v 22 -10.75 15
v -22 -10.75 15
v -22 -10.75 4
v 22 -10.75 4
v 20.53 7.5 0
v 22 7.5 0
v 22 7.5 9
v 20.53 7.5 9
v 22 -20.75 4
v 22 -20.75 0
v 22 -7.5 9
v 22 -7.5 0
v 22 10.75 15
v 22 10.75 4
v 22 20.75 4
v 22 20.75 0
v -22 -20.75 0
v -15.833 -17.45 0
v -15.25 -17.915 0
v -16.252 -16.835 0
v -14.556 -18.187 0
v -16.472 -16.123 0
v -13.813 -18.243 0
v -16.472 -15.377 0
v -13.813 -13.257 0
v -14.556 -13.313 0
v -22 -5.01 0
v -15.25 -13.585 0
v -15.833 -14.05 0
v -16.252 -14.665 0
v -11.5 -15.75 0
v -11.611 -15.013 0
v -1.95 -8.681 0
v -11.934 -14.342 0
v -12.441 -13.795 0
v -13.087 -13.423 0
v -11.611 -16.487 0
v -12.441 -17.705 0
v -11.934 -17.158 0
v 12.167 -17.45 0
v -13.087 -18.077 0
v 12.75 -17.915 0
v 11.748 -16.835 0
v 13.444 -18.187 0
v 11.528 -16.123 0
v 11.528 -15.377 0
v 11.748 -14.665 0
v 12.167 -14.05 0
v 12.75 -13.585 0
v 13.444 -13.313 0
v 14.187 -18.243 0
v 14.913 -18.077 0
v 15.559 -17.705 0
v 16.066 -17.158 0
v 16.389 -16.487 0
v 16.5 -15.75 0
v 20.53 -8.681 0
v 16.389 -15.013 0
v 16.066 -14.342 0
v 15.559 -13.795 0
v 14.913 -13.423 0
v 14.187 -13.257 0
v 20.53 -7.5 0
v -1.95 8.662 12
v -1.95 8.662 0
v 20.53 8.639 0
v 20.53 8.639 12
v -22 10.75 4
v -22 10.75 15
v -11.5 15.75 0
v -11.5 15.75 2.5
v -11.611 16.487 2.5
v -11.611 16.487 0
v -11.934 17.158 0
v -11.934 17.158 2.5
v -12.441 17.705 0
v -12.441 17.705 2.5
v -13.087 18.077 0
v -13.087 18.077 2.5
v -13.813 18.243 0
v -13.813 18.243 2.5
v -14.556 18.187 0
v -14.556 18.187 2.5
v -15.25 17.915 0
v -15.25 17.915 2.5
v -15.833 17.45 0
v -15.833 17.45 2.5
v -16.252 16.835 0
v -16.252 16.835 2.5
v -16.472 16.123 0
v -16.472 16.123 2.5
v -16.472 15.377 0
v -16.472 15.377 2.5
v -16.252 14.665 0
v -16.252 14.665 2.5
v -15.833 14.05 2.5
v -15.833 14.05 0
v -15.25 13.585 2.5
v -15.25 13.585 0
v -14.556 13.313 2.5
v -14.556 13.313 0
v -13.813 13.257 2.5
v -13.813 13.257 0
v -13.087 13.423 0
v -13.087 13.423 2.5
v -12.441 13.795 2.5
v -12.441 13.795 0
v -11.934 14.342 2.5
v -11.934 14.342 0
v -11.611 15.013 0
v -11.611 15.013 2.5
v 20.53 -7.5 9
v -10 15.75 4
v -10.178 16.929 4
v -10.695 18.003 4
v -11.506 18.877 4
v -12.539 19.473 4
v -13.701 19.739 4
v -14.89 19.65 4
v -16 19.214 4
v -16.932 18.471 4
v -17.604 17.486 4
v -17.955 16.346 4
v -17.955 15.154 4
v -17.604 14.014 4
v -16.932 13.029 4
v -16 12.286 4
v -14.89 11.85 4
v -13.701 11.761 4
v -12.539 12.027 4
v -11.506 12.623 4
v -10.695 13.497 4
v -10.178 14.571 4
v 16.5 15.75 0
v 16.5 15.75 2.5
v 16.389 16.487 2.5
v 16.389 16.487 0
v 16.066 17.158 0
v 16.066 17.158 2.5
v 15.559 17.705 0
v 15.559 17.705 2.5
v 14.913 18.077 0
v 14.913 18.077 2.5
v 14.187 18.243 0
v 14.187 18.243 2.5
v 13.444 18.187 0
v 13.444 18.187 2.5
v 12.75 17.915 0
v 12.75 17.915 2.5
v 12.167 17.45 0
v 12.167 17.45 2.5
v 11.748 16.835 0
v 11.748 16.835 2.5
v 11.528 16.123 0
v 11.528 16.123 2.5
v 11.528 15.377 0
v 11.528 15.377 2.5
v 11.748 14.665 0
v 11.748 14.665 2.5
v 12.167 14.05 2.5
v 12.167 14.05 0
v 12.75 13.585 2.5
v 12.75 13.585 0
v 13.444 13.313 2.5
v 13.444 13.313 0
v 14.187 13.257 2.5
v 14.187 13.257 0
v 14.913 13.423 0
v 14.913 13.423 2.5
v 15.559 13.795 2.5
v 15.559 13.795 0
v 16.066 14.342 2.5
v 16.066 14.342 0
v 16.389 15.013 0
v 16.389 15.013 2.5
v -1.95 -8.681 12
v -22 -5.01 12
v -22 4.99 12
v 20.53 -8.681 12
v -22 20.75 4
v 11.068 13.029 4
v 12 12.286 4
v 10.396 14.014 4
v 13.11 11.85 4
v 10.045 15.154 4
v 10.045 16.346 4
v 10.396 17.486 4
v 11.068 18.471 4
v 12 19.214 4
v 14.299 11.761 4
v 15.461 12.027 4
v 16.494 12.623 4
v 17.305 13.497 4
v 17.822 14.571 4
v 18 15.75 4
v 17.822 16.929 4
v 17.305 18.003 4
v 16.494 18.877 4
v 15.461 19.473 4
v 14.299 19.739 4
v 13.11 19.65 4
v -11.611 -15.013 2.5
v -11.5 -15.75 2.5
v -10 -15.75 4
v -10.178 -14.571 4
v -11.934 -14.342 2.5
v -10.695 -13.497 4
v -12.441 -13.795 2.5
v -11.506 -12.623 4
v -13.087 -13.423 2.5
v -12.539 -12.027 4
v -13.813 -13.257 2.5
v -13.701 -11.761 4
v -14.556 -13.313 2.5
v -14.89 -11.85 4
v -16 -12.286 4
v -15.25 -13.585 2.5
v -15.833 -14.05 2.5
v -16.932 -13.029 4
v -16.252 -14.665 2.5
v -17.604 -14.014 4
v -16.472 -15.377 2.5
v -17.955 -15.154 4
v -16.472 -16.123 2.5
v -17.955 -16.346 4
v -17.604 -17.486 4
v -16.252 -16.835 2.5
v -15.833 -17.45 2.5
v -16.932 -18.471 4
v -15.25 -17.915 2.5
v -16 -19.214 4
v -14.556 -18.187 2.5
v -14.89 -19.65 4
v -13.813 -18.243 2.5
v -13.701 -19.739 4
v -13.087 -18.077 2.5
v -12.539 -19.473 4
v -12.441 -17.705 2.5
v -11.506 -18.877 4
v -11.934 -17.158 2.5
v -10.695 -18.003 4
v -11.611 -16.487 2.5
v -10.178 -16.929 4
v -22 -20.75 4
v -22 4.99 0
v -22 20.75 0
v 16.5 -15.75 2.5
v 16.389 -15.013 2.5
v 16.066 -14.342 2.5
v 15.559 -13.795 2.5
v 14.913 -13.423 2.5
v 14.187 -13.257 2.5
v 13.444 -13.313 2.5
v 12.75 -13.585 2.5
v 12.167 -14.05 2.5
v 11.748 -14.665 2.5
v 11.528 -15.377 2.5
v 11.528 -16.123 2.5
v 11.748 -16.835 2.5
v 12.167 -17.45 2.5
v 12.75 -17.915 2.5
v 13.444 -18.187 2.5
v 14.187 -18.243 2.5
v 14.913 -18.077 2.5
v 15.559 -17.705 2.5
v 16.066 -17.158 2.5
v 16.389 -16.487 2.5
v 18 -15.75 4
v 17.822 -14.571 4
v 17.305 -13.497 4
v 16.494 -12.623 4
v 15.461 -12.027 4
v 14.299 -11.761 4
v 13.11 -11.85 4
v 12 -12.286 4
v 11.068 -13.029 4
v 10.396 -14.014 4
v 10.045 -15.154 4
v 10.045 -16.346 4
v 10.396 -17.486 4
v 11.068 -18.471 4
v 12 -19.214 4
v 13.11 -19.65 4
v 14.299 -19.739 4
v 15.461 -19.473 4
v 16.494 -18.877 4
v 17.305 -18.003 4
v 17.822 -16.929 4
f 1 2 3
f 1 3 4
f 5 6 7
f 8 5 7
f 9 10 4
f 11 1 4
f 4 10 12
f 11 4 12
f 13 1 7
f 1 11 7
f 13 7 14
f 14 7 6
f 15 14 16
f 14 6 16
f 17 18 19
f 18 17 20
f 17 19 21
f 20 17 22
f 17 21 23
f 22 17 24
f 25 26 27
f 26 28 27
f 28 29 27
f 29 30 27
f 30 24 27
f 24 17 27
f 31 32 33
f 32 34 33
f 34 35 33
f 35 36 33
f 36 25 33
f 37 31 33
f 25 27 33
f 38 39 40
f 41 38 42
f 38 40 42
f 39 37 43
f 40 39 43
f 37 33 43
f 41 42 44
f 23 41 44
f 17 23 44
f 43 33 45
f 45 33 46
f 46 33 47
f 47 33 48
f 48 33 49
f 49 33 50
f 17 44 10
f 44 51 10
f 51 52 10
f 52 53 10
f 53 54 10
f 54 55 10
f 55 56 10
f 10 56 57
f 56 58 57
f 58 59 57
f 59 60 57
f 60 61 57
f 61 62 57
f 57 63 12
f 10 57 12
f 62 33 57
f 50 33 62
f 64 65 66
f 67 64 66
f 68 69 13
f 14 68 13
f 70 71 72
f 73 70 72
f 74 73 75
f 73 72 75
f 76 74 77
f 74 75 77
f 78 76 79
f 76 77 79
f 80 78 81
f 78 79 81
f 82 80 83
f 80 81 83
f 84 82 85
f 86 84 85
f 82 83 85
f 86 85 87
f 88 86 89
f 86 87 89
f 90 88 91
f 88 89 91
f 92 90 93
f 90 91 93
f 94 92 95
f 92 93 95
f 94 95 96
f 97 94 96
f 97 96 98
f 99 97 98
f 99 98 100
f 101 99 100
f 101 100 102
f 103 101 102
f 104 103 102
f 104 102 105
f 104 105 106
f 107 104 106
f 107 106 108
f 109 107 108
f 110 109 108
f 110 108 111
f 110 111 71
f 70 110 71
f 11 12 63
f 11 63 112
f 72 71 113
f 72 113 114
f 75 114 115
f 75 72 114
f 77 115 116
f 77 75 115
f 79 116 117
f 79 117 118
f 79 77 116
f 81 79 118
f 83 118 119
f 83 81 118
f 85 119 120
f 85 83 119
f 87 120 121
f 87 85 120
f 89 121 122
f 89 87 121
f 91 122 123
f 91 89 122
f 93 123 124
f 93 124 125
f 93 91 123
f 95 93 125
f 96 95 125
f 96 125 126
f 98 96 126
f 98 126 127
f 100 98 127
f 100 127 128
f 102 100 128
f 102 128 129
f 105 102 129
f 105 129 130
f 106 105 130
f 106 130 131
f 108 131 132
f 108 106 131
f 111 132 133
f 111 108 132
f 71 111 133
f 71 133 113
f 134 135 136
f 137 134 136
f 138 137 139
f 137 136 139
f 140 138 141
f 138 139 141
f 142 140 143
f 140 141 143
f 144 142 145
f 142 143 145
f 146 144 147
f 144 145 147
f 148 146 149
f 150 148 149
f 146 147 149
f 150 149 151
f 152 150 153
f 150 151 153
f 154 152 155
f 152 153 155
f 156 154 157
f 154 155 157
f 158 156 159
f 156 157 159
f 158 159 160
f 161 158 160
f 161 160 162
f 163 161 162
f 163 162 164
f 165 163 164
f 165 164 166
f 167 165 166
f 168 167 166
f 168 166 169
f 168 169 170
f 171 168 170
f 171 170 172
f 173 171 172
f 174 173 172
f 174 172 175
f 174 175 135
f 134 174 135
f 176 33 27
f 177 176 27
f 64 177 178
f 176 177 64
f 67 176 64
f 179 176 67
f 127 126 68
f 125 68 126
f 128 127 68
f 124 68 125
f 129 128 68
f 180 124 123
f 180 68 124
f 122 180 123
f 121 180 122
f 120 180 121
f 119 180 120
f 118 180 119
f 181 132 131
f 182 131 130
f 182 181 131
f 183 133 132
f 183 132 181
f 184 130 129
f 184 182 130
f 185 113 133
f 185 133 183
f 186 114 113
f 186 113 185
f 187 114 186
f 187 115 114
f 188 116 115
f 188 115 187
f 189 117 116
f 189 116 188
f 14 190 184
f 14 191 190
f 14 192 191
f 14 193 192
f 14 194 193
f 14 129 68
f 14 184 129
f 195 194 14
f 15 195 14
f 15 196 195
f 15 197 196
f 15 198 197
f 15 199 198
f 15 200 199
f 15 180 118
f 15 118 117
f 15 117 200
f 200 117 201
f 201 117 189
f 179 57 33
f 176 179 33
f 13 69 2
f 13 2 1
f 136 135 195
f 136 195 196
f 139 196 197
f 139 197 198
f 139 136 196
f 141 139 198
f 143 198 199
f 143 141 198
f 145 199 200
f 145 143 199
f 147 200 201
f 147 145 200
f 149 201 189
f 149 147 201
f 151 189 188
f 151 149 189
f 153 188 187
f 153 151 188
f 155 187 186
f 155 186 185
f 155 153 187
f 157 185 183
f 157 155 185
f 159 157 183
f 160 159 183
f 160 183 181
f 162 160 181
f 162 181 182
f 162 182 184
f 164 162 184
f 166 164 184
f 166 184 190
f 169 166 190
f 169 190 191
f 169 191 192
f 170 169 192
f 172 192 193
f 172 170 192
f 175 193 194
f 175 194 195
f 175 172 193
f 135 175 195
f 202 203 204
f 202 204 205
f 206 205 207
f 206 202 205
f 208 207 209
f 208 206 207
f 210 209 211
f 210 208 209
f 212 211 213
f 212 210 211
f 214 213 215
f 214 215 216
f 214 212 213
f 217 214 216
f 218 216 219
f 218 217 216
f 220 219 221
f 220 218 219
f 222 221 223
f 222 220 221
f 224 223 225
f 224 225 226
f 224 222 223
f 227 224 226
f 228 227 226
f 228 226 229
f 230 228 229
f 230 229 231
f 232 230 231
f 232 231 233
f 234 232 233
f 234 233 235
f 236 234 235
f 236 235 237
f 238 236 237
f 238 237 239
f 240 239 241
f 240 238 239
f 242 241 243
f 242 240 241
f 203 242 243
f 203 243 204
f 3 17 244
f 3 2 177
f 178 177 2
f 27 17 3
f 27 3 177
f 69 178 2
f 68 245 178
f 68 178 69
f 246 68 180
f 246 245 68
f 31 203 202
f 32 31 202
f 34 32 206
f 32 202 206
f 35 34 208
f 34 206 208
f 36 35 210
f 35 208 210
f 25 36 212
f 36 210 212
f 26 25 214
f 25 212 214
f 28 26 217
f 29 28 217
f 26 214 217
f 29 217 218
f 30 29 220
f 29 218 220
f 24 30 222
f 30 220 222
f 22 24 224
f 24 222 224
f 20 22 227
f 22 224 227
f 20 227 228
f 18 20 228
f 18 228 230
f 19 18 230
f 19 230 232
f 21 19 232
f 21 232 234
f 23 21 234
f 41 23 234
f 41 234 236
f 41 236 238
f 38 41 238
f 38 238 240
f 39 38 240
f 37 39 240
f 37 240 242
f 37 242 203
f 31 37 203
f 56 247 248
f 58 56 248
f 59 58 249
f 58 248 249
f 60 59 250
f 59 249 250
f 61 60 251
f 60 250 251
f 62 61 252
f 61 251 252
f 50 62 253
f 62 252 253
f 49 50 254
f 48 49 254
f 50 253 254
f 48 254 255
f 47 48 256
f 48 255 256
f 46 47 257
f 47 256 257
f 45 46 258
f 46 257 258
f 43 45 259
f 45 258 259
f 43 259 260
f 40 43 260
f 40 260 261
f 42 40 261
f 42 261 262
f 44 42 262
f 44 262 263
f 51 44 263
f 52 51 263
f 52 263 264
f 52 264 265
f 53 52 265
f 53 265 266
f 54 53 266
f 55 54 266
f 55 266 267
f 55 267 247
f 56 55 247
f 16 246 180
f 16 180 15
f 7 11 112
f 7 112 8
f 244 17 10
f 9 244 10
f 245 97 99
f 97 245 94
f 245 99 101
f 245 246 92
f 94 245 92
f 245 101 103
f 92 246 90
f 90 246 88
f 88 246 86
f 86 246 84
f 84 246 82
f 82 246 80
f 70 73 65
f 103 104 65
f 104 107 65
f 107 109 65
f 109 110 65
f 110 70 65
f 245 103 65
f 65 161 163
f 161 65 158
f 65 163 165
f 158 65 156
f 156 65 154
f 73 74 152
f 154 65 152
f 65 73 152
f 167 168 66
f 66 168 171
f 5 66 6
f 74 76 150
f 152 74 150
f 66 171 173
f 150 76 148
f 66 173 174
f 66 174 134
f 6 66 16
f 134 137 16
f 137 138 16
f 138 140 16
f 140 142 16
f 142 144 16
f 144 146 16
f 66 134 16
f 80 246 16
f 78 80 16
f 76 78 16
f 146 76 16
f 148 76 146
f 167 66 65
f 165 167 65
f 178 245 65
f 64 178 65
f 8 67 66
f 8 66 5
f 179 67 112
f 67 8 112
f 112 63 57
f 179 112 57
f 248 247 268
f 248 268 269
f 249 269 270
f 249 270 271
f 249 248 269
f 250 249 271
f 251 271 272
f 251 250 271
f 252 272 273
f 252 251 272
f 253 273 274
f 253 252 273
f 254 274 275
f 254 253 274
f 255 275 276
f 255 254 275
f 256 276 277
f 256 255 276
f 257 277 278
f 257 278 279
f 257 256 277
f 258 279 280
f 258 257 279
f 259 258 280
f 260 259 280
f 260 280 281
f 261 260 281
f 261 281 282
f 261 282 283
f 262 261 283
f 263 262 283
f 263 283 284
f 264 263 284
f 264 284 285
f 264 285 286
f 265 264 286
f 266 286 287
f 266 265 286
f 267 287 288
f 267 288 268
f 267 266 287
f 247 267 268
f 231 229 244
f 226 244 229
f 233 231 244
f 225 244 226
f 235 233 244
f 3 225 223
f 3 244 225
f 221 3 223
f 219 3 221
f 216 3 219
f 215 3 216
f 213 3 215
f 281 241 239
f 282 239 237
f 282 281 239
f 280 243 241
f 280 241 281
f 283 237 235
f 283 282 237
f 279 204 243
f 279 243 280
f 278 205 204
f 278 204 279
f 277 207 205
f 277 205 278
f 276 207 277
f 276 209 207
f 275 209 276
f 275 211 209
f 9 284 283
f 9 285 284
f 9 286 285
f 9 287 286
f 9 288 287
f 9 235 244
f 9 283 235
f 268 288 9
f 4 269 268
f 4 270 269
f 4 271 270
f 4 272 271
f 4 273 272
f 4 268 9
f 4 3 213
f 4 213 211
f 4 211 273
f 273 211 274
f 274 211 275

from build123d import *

# Parameters (mm, degrees)
SKETCH001_W     = 44
SKETCH001_H     = 41.5
PAD_DEPTH       = 15
POCKET_DEPTH    = 12
SKETCH002_W     = 15
SKETCH002_H     = 9
POCKET001_DEPTH = 5
SKETCH003_W     = 44
SKETCH003_H     = 10
POCKET002_DEPTH = 11
SKETCH004_R     = 2.5
POCKET003_DEPTH = 5
CHAMFER_SIZE    = 1.5


with BuildPart() as part:
    # Sketch001 → Pad (new body)
    with BuildSketch(Plane.XY):
        Rectangle(SKETCH001_W, SKETCH001_H)
    extrude(amount=PAD_DEPTH)

    # Sketch (on Face5 of Pad) → Pocket (cut)
    with BuildSketch(Plane(origin=(0, 0, 0), x_dir=(1, 0, 0), z_dir=(0, 0, -1))):
        Polygon((20.53, 8.680906), (-1.95, 8.680906), (-22, 5.009672), (-22, -4.990328), (-1.949989, -8.661501), (20.53, -8.639094), align=None)
    extrude(amount=-POCKET_DEPTH, mode=Mode.SUBTRACT)

    # Sketch002 (on Face3 of Pocket) → Pocket001 (cut)
    with BuildSketch(Plane.YZ.offset(22)):
        with Locations((0, 4.5)):
            Rectangle(SKETCH002_W, SKETCH002_H)
    extrude(amount=-POCKET001_DEPTH, mode=Mode.SUBTRACT)

    # Sketch003 (on Face5 of Pocket001) → Pocket002 (cut)
    with BuildSketch(Plane.XY.offset(15)):
        with Locations((0, -15.75)):
            Rectangle(SKETCH003_W, SKETCH003_H)
        with Locations((0, 15.75)):
            Rectangle(SKETCH003_W, SKETCH003_H)
    extrude(amount=-POCKET002_DEPTH, mode=Mode.SUBTRACT)

    # Sketch004 (on Face14 of Pocket002) → Pocket003 (cut)
    with BuildSketch(Plane.XY.offset(4)):
        with Locations((-14, -15.75)):
            Circle(SKETCH004_R)
        with Locations((14, -15.75)):
            Circle(SKETCH004_R)
        with Locations((-14, 15.75)):
            Circle(SKETCH004_R)
        with Locations((14, 15.75)):
            Circle(SKETCH004_R)
    extrude(amount=-POCKET003_DEPTH, mode=Mode.SUBTRACT)

    # Chamfer
    chamfer_edges = [part.edges().sort_by_distance(p)[0] for p in [
        (11.5, -15.75, 4),
        (-16.5, -15.75, 4),
        (-16.5, 15.75, 4),
        (11.5, 15.75, 4),
    ]]
    chamfer(chamfer_edges, length=CHAMFER_SIZE)


solid = part.part
